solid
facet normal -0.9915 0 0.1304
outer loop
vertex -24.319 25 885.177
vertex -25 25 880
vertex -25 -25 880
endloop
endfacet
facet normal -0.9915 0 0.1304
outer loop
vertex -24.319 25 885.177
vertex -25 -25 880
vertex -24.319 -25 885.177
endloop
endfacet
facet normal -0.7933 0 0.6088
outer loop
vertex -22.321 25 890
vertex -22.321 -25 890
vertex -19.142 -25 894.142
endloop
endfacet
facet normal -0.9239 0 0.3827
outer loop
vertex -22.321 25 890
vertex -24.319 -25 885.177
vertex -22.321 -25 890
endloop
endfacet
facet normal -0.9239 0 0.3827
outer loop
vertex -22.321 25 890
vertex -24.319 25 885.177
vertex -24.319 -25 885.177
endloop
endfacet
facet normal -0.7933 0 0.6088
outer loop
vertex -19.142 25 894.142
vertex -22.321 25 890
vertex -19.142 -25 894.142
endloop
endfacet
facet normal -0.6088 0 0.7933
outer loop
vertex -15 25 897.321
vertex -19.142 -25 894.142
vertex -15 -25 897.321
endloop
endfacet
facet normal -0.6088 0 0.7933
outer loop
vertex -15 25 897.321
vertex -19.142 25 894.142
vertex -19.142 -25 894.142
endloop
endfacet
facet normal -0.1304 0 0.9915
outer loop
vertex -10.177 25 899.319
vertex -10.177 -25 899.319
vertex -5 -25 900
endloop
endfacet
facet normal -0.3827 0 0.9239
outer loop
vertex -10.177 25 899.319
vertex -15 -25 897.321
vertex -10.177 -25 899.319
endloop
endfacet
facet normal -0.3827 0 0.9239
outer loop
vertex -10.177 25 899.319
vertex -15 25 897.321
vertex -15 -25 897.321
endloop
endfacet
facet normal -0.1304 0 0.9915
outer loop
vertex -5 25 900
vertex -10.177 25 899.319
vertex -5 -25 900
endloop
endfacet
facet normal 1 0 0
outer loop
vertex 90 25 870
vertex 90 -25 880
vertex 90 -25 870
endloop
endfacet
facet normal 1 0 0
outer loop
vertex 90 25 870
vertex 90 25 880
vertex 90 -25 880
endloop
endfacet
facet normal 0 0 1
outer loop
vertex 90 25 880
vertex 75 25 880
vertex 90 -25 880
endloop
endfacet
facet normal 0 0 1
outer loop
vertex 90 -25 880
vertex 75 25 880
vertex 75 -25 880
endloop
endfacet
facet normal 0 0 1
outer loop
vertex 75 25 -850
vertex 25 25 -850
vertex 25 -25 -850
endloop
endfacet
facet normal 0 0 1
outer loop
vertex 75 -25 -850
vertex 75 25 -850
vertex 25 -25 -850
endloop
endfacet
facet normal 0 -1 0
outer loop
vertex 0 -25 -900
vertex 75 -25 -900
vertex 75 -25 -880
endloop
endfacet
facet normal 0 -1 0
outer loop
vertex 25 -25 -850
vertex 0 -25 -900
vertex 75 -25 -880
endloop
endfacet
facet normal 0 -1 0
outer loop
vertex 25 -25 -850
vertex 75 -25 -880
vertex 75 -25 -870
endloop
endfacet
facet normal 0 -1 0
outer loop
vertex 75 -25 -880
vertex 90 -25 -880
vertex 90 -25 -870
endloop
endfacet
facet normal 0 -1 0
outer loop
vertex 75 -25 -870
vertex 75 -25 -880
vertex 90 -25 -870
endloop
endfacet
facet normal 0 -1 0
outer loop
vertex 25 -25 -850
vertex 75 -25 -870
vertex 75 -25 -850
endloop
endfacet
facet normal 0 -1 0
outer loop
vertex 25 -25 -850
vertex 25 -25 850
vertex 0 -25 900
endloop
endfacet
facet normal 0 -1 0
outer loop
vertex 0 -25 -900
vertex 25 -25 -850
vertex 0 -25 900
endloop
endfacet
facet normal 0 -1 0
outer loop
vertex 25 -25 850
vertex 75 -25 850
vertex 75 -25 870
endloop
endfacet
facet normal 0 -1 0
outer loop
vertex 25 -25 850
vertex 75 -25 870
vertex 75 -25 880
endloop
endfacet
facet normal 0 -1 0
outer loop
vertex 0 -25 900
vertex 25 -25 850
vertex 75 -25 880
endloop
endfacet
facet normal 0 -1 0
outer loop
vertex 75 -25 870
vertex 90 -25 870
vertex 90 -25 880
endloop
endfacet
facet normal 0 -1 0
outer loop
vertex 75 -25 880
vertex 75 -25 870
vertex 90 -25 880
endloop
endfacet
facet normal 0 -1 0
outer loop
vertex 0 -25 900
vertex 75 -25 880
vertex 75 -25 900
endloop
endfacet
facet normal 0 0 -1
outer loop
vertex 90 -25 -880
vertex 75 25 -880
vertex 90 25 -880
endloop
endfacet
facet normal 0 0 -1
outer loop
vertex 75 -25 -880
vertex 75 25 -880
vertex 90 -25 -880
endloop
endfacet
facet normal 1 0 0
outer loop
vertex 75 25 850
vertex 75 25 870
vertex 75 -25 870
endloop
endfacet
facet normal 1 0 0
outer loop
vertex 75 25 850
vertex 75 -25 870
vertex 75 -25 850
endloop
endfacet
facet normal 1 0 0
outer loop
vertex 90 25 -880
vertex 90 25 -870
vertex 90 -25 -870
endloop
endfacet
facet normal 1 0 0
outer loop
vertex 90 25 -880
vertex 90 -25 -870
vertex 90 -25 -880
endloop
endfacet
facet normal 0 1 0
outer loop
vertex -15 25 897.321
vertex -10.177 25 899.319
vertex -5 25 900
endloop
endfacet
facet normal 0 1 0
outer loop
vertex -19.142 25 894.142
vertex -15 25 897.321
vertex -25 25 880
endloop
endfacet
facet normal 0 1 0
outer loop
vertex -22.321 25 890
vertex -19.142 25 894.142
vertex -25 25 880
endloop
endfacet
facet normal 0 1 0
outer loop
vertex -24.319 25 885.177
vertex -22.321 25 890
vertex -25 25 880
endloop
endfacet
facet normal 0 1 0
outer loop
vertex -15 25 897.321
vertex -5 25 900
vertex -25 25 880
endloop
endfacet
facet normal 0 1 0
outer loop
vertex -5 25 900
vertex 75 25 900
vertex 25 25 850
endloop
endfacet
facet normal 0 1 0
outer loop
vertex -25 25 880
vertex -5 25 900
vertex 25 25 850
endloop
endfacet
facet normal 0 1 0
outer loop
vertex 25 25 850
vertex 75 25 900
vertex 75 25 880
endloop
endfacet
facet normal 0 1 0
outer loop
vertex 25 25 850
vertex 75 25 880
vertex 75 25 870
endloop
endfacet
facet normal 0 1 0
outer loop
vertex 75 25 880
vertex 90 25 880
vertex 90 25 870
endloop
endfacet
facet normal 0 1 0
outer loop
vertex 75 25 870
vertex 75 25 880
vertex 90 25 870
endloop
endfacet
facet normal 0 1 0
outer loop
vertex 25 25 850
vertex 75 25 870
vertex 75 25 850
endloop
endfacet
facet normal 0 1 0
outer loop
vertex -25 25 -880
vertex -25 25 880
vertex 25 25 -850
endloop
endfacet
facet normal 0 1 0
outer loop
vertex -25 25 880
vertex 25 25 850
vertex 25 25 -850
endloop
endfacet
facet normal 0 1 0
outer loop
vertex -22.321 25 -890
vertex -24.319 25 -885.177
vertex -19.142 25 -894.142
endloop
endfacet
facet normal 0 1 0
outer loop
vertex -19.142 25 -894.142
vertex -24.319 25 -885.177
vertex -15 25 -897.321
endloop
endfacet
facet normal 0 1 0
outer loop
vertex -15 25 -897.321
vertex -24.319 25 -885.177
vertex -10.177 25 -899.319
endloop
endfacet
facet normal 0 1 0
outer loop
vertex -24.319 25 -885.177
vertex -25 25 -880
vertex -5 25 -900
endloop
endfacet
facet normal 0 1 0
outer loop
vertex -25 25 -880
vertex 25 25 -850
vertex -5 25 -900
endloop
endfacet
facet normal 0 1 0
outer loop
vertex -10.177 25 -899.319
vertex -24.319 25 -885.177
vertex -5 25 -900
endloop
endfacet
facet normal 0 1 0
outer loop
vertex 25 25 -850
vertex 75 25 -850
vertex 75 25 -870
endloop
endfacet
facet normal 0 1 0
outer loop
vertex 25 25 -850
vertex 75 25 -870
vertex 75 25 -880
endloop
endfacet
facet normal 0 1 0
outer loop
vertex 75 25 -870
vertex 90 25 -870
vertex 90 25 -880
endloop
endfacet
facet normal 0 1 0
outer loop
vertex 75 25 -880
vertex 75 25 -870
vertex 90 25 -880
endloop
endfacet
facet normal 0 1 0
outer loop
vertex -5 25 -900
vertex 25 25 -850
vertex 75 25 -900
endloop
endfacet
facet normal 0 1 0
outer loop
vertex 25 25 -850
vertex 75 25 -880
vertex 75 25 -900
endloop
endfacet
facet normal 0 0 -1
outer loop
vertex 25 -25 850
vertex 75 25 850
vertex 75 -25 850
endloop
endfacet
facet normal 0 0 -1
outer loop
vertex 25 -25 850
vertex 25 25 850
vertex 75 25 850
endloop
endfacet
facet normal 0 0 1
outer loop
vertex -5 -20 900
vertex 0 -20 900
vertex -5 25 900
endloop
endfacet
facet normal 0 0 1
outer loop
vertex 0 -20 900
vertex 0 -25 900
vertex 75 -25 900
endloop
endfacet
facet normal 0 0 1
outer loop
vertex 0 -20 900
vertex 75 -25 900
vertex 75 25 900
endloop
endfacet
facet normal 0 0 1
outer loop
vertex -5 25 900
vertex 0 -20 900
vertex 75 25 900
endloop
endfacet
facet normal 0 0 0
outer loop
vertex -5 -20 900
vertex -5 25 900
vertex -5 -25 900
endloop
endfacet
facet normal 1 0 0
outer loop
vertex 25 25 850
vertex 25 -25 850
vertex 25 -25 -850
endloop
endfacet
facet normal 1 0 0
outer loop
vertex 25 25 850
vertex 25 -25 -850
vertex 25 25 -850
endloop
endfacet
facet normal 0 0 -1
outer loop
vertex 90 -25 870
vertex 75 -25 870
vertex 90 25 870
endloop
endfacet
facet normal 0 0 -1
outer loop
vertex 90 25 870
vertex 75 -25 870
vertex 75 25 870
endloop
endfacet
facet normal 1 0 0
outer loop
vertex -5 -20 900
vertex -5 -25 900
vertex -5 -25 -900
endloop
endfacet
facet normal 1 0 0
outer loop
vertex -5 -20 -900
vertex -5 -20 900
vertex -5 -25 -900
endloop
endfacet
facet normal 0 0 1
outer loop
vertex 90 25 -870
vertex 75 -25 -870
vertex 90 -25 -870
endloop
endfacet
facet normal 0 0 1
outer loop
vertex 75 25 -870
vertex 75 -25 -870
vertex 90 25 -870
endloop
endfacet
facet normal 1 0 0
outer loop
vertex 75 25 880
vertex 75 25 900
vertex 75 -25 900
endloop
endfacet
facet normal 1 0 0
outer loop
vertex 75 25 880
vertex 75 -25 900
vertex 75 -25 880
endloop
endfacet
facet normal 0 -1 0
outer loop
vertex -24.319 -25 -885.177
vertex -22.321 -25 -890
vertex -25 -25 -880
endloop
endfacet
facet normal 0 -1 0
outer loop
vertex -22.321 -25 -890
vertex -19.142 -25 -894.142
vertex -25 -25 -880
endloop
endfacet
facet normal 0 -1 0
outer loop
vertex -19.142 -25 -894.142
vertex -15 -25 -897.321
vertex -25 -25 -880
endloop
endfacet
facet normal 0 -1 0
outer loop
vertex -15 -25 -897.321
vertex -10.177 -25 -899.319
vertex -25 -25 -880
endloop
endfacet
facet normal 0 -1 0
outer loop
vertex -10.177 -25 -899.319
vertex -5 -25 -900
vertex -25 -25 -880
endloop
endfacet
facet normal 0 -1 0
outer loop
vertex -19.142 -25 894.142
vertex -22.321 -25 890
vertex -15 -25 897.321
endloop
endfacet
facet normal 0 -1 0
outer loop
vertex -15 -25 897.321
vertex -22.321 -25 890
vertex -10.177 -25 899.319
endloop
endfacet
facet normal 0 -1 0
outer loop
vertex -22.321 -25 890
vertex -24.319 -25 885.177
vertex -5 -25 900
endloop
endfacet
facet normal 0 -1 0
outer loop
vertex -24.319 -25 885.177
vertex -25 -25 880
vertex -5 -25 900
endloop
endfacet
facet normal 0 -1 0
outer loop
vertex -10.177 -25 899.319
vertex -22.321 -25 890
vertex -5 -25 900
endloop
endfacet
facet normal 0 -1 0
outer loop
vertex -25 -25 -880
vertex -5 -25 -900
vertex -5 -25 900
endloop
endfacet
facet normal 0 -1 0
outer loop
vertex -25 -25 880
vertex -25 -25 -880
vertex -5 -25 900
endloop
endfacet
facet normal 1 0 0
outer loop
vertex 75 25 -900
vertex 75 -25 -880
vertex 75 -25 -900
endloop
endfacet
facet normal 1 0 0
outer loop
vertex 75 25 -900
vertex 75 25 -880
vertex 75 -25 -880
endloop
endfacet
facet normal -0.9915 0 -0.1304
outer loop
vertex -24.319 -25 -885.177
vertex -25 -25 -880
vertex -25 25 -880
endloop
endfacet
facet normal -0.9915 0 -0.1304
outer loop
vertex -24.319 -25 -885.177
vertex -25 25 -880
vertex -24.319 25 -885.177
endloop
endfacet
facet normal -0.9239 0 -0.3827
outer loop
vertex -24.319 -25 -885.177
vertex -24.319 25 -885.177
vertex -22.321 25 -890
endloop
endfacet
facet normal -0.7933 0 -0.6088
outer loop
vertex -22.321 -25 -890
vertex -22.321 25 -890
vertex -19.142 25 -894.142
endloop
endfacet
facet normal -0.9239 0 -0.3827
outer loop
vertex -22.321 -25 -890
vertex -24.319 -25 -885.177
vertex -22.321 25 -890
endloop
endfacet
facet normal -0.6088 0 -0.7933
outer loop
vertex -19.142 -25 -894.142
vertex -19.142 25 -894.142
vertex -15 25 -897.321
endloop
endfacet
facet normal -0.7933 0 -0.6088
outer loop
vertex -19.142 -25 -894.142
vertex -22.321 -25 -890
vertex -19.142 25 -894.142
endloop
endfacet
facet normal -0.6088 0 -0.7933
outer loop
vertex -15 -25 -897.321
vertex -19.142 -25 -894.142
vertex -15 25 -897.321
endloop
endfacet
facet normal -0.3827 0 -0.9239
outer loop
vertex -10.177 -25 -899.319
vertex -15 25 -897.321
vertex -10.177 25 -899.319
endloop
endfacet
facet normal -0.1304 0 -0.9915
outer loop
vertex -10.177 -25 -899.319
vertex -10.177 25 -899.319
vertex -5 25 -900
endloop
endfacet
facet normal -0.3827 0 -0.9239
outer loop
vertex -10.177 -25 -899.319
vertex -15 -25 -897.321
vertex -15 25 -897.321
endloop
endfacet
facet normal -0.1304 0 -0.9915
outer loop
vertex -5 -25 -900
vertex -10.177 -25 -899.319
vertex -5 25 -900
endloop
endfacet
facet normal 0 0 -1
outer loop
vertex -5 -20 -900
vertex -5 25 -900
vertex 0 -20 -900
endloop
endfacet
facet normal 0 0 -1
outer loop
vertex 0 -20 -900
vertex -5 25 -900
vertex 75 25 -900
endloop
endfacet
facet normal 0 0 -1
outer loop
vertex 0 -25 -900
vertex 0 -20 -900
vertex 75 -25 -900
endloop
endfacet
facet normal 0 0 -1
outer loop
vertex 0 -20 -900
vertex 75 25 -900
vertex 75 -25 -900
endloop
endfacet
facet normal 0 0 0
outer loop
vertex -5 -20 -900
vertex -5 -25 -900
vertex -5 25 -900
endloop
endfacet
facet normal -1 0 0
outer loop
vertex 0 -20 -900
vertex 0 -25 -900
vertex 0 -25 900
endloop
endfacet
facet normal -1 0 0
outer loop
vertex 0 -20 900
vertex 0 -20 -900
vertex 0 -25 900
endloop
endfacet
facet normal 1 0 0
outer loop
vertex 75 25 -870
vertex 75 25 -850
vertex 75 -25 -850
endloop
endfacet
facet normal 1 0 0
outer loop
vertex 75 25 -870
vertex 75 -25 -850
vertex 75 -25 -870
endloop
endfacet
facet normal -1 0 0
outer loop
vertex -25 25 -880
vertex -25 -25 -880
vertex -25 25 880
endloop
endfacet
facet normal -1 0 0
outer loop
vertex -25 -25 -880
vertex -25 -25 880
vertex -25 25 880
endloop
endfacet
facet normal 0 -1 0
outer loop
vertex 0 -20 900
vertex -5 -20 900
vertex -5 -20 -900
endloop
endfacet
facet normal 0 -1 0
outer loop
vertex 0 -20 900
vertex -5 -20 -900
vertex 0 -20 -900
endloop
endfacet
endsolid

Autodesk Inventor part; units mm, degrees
ref_plane "YZ Plane" through (0, 0, 0) normal (1, 0, 0) x (0, 1, 0)
ref_plane "XZ Plane" through (0, 0, 0) normal (0, 1, 0) x (-1, 0, 0)
ref_plane "XY Plane" through (0, 0, 0) normal (0, 0, 1) x (1, 0, 0)
sketch "草图1" plane through (0, 0, 0) normal (1, 0, 0) x (0, 1, 0)
  line L0 (-25, 900) -> (25, 900)
  line L1 (25, 900) -> (25, -900)
  line L2 (25, -900) -> (-25, -900)
  line L3 (-25, -900) -> (-25, 900)
  line L4 (-25, 900) -> (25, -900) construction
  line L5 (25, 900) -> (-25, -900) construction
  point P0 (0, 0)
  dimension "d0" = 50
  dimension "d1" = 1800
extrude "拉伸1" add sketch "草图1" against normal mid plane 50
sketch "草图2" plane through (25, 0, 0) normal (1, 0, 0) x (0, 0, -1)
  line L0 (-900, -25) -> (-900, 25) projected
  line L1 (-900, 25) -> (-850, 25)
  line L2 (-850, 25) -> (-850, -25)
  line L3 (-850, -25) -> (-900, -25)
  line L4 (-900, -25) -> (-900, 25)
  line L5 (-900, 25) -> (900, 25) construction
  line L6 (0, 25) -> (0, -25) construction
  line L7 (900, -25) -> (-900, -25) construction
  line L8 (900, -25) -> (900, 25)
  line L9 (900, 25) -> (850, 25)
  line L10 (850, 25) -> (850, -25)
  line L11 (850, -25) -> (900, -25)
  line L12 (900, -25) -> (900, 25)
  line L13 (900, 25) -> (-900, 25) construction
  line L14 (-900, -25) -> (900, -25) construction
  point P0 (0, 0)
  dimension "d4" = 50
  dimension "d5" = 50
extrude "拉伸2" add sketch "草图2" along normal blind 50
sketch "草图3" plane through (75, 0, 0) normal (1, 0, 0) x (0, 0, -1)
  line L0 (850, 25) -> (850, -25) projected
  line L1 (850, 25) -> (870, 25)
  line L2 (900, 25) -> (880, 25)
  line L3 (870, 25) -> (880, 25)
  line L4 (880, 25) -> (880, -25)
  line L5 (880, -25) -> (870, -25)
  line L6 (870, -25) -> (870, 25)
  line L7 (0, 25) -> (0, -25) construction
  line L8 (-850, 25) -> (-850, -25)
  line L9 (-850, 25) -> (-870, 25)
  line L10 (-900, 25) -> (-880, 25)
  line L11 (-870, 25) -> (-880, 25)
  line L12 (-880, 25) -> (-880, -25)
  line L13 (-880, -25) -> (-870, -25)
  line L14 (-870, -25) -> (-870, 25)
  line L15 (880, -25) -> (870, -25)
  line L16 (850, -25) -> (900, -25) projected
  line L17 (-880, -25) -> (-870, -25)
  line L18 (900, -25) -> (-900, -25) projected
  point P0 (0, 0)
  point P1 (-900, 25)
  point P2 (-850, 25)
  dimension "d10" = 10
  dimension "d11" = 20
extrude "拉伸3" add sketch "草图3" along normal blind 15 contours L3 L4 L5 L6 | L13 L12 L11 L14
sketch "草图4" plane through (-25, -25, -900) normal (0, -1, 0) x (1, 0, 0)
  line L0 (0, 0) -> (20, 0)
  line L1 (100, 0) -> (0, 0) projected
  line L2 (20, 0) -> (30, 0)
  line L3 (20, 0) -> (25, 0)
  line L4 (25, 0) -> (25, 1800)
  line L5 (25, 1800) -> (20, 1800)
  line L6 (20, 1800) -> (20, 0)
  line L7 (0, 1800) -> (100, 1800) projected
  point P0 (25, 900)
  dimension "d12" = 20
  dimension "d13" = 10
  dimension "d14" = 5
  dimension "d16" = 1800
extrude "拉伸4" cut sketch "草图4" against normal blind 5
fillet "圆角1" radius 20 2 edges at (-25, 0, 900) (-25, 0, -900)
properties part number "水平滑台"
